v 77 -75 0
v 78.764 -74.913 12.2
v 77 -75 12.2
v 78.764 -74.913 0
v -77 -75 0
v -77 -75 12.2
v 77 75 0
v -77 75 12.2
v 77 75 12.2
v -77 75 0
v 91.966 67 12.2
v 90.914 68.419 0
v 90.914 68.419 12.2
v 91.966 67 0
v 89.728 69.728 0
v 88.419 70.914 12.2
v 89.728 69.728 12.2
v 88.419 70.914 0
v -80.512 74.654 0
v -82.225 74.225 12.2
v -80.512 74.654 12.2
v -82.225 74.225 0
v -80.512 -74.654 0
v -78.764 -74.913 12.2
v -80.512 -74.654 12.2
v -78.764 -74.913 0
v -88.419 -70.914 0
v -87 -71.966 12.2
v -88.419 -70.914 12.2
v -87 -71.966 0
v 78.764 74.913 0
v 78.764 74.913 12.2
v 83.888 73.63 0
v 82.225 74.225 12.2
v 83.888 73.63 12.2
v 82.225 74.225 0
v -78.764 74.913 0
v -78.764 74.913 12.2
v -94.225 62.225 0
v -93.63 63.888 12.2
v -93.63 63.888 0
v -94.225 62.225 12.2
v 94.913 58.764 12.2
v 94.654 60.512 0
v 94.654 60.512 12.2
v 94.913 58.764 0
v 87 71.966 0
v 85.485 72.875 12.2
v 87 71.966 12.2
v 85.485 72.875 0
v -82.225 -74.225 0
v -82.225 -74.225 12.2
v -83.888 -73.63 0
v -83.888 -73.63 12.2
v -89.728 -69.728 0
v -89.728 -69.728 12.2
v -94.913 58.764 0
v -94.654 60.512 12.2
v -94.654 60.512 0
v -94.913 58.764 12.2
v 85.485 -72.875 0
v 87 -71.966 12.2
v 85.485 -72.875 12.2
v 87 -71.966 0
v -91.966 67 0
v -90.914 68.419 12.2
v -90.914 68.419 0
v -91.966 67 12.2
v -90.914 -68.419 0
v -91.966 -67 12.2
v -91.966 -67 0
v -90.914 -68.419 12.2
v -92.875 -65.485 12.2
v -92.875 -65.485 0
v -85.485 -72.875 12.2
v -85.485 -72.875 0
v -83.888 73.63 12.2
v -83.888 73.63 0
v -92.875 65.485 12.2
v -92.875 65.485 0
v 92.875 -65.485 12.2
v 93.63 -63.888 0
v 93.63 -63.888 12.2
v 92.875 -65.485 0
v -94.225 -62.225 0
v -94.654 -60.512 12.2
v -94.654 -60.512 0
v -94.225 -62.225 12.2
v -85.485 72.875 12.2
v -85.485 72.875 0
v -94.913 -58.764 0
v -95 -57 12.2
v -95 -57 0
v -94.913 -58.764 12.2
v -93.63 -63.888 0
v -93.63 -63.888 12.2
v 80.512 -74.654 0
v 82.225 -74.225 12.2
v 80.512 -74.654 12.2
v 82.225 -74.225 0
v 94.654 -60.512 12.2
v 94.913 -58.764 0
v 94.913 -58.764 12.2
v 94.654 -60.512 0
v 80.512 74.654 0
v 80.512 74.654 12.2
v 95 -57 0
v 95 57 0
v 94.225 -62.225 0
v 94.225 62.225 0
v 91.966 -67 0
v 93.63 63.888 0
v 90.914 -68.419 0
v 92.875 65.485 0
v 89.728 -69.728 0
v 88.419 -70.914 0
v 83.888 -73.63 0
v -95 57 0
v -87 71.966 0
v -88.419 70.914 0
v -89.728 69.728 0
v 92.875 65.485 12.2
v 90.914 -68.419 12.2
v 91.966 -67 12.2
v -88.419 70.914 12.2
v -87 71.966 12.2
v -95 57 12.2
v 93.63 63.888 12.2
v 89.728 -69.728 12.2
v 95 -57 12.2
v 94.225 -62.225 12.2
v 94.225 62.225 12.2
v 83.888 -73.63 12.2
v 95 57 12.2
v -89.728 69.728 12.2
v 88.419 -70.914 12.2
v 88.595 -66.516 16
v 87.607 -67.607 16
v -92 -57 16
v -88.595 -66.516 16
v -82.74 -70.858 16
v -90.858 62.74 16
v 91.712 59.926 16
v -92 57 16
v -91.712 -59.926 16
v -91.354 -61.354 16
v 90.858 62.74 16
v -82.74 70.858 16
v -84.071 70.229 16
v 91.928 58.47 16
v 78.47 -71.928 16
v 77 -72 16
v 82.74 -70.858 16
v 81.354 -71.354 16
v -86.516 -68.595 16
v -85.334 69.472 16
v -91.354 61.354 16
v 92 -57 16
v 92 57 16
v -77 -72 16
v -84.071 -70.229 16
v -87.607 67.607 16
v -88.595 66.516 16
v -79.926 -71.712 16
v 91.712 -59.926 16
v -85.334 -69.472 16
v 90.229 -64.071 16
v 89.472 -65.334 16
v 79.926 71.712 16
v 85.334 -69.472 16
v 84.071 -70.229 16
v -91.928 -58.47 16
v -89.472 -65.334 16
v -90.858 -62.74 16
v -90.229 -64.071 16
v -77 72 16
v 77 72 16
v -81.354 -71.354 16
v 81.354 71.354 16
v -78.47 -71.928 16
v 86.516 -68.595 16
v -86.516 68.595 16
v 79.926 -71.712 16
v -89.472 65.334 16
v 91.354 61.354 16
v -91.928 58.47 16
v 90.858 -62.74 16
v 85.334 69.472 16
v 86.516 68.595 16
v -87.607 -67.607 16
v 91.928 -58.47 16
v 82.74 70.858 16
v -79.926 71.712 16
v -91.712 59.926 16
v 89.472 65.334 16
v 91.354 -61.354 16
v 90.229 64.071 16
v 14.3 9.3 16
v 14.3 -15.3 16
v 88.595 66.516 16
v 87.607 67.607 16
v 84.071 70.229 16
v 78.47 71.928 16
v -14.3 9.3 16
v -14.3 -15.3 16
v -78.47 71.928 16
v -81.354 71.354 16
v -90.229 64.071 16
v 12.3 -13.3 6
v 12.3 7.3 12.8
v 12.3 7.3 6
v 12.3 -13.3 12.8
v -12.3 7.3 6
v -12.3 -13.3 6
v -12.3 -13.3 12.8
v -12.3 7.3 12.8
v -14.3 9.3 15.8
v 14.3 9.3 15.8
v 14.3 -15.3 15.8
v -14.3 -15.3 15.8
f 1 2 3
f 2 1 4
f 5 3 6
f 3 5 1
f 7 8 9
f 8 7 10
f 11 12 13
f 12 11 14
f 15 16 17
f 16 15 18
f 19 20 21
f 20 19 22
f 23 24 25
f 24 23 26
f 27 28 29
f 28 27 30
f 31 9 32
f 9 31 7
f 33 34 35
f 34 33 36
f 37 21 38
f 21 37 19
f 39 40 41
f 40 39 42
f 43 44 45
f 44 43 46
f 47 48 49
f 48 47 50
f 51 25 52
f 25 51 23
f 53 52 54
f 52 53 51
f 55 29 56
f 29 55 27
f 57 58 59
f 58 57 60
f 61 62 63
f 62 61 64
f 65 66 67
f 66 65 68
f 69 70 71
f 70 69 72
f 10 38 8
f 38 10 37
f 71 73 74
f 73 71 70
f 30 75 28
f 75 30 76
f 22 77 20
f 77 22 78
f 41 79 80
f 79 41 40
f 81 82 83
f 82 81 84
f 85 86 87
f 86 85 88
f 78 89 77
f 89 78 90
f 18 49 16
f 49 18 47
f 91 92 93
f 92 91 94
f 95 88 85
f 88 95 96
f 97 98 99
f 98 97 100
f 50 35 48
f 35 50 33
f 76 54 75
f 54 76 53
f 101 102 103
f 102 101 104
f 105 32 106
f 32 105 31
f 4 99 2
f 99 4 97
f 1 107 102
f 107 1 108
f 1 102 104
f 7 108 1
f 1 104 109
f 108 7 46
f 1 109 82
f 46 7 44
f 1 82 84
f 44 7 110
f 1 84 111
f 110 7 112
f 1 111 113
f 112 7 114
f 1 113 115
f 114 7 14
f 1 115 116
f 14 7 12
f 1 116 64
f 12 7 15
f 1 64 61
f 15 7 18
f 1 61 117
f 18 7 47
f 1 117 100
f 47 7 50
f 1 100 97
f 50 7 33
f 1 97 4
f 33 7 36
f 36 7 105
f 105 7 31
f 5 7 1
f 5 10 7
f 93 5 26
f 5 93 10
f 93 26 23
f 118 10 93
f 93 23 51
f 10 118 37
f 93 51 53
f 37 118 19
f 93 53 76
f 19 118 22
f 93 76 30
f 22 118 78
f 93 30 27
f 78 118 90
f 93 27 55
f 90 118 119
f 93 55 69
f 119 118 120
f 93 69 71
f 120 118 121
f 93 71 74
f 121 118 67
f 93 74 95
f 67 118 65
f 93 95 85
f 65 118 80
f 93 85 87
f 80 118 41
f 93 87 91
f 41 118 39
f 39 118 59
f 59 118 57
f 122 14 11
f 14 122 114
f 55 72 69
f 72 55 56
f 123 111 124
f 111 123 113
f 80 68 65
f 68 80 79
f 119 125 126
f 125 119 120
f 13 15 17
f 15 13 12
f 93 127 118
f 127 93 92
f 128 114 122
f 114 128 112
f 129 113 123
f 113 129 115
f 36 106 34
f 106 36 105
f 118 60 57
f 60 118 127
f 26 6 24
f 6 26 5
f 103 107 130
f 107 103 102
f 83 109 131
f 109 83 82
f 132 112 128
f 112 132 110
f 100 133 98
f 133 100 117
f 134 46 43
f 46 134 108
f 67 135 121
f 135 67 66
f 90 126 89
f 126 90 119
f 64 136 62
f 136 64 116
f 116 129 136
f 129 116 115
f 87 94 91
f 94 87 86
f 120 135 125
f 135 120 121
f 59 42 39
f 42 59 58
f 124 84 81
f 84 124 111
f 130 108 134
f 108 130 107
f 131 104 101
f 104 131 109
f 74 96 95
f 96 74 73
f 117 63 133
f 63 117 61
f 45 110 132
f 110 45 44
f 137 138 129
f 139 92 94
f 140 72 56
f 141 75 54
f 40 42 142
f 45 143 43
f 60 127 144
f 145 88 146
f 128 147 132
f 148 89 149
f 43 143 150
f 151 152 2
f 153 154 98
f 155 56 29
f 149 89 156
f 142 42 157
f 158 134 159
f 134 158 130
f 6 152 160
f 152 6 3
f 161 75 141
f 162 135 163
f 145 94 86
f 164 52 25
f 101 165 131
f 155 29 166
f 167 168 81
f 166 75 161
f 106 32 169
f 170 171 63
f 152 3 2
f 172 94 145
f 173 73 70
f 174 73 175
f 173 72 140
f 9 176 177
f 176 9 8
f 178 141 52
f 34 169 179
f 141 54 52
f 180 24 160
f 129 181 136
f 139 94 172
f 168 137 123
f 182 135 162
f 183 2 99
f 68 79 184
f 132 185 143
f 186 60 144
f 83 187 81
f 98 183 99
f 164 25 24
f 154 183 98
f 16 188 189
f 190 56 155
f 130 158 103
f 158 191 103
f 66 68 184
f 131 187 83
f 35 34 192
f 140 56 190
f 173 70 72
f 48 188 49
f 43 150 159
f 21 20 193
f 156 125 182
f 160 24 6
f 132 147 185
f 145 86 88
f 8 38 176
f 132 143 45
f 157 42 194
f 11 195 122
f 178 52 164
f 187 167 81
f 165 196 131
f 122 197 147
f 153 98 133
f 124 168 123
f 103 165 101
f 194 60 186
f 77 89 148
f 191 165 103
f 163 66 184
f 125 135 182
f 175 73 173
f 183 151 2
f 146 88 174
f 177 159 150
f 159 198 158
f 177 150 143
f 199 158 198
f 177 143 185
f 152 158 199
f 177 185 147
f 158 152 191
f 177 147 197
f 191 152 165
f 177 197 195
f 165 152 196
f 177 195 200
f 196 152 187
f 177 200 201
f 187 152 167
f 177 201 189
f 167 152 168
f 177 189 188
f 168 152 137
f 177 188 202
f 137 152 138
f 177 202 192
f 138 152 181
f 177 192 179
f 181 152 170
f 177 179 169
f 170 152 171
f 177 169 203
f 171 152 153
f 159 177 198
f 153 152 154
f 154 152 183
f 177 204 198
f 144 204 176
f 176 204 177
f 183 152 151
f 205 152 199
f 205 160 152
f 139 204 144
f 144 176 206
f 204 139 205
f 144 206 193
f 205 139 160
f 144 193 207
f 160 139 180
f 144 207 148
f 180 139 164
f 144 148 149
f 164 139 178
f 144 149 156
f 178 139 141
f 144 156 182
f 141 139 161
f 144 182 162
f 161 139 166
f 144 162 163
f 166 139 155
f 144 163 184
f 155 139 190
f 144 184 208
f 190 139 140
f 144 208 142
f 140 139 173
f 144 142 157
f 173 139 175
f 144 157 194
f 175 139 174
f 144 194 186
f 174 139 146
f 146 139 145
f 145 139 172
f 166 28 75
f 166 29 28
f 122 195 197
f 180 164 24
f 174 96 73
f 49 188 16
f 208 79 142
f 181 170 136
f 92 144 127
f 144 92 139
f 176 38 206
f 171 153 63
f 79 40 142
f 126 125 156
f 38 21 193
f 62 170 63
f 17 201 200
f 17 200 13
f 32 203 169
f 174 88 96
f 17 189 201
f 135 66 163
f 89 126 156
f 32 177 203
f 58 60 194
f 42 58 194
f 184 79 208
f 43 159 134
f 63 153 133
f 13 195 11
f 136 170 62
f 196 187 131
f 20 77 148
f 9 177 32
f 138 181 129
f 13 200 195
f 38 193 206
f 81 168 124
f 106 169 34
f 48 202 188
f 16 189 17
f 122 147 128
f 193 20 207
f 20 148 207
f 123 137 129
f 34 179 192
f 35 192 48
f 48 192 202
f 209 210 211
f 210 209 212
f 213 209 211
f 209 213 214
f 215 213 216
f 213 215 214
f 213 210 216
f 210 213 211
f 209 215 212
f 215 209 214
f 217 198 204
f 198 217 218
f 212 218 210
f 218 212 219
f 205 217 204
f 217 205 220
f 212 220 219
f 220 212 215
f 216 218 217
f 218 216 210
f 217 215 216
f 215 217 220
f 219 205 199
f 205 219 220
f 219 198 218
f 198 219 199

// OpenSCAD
// Headphone stand in three parts: base, post, hanger.
// No glue, no screws. Rectangular tenon/socket press/clearance fits;
// rectangular sections stop the hanger spinning on the post.
// Print orientations:
//   base   - flat on the bed, socket up
//   post   - lying on its back face, long axis along X
//   hanger - lying on one side face, saddle profile in the X/Y plane
// Assembled top of hanger is 270 mm above the desk.

part = "base"; // [base, post, hanger, assembly]
cadverify_only = "";

$fn = 64;

/* Dimensions (mm) */
base_w = 190;
base_d = 150;
base_t = 16;
base_r = 18;

desk_to_hanger_top = 270;

post_len_print = 241;       // use z 7..248
hanger_len = 124;           // use/print x -62..62
hanger_width = 36;          // use y -18..18
hanger_h_print = 38;        // use z 232..270 at centre

/* Socket / tenon geometry (use coordinates, for reference)
   Post main section:  x -16..16, y -13..13
   Bottom tenon:       x -12..12, y -13..7,  z 7..16   (base socket z 6..16)
   Top tenon:          x -12..12, y -13..3,  z 232..248 (hanger socket from z 232)
   Sockets are tenon size + 0.3 mm clearance per side, with flared mouths.
*/

module instance(name, part_name, unit = 1) {
    echo(cadverify_instance = [name, part_name, unit]);
    if (cadverify_only == "" || cadverify_only == name) children();
}

module box3(x0, x1, y0, y1, z0, z1) {
    translate([x0, y0, z0]) cube([x1 - x0, y1 - y0, z1 - z0]);
}

module rounded_rect(w, d, r) {
    offset(r = r) square([w - 2 * r, d - 2 * r], center = true);
}

/* ---------------- BASE (print = use orientation) ---------------- */
module base_part() {
    difference() {
        union() {
            linear_extrude(12) rounded_rect(base_w, base_d, base_r);
            // 45-ish top edge taper: inset 3 mm over 4 mm height
            hull() {
                translate([0, 0, 12]) linear_extrude(0.2)
                    rounded_rect(base_w, base_d, base_r);
                translate([0, 0, base_t - 0.2]) linear_extrude(0.2)
                    rounded_rect(base_w - 6, base_d - 6, base_r - 3);
            }
        }
        // socket for post bottom tenon: 24.6 x 20.6, centre y=-3, floor z=6
        box3(-12.3, 12.3, -13.3, 7.3, 6, 17);
        // flared socket mouth (entry chamfer), 28.6 x 24.6 at the top face
        hull() {
            translate([0, -3, 15.9]) cube([28.6, 24.6, 0.2], center = true);
            translate([0, -3, 12.9]) cube([24.6, 20.6, 0.2], center = true);
        }
    }
}

/* ---------------- POST (print orientation) ----------------
   Print axes: X = use Z (length, 0 at bottom-tenon tip), Y = use X, Z = use Y + 13.
   Every section reaches Z=0 (the use back face), so it lies flat on the bed. */
module post_part() {
    union() {
        // bottom tenon, tapered lead-in in plan, 24 wide x 20 deep
        linear_extrude(20)
            polygon([[0, -9], [3, -12], [9, -12], [9, 12], [3, 12], [0, 9]]);
        // main shaft 32 x 26
        box3(9, 225, -16, 16, 0, 26);
        // bottom collar 52 wide, sits on the base top
        box3(9, 19, -26, 26, 0, 26);
        // top collar 48 wide, supports the hanger underside
        box3(217, 225, -24, 24, 0, 26);
        // top tenon, tapered lead-in in plan, 24 wide x 16 deep
        linear_extrude(16)
            polygon([[225, -12], [238, -12], [241, -9], [241, 9], [238, 12], [225, 12]]);
    }
}

/* ---------------- HANGER (print orientation) ----------------
   Print axes: X = use X, Y = use Z - 232, Z = use Y side face (0 on the bed).
   The saddle profile (parabolic top and bottom) is extruded across the width. */
module hanger_profile() {
    top = [for (i = [0 : 20]) let (x = -62 + 124 * i / 20)
        [x, hanger_h_print - 14 * pow(x / 62, 2)]];
    bot = [for (i = [20 : -1 : 0]) let (x = -62 + 124 * i / 20)
        [x, 12 * pow(x / 62, 2)]];
    polygon(concat(top, bot));
}

// Prismatic cutter in the Y/Z plane, extruded along X from -75 to 75.
// yz points are [y, z]; the region is the polygon given.
module cutter_yz(yz) {
    pts = [for (p = yz) [-p[1], p[0]]];   // local x = -z, local y = y
    translate([-75, 0, 0]) rotate([0, 90, 0]) linear_extrude(150) polygon(pts);
}

module hanger_part() {
    difference() {
        // saddle body: profile extruded 36 across
        linear_extrude(hanger_width) hanger_profile();
        // rounded (chamfered) longitudinal edges of the saddle top:
        // in print these cut the Y=profile-top / Z=0 and Z=36 corners.
        cutter_yz([[32, 36], [44, 30], [44, 52], [32, 52]]);   // Z=36 side
        cutter_yz([[32, -12], [44, -12], [44, 12], [32, 0]]);  // Z=0 side
        // socket for post top tenon: x -12.3..12.3, print z 14.7..31.3, depth to y=18
        box3(-12.3, 12.3, -2, 18, 14.7, 31.3);
        // flared socket mouth at the underside (print y = 0 face of the pocket)
        hull() {
            box3(-14.3, 14.3, -1.0, -0.8, 12.7, 33.3);
            box3(-12.3, 12.3, 5.0, 5.2, 14.7, 31.3);
        }
    }
}

/* ---------------- VERIFIABLE SPECS ---------------- */
if (part == "base") {
    echo(cadverify_spec = [
        ["bounds", [[-base_w/2, -base_d/2, 0], [base_w/2, base_d/2, base_t]]],
        ["bodies", 1],
        ["through_holes", 0],
        ["support_faces", [["bottom", "-z", 20000]]],
        ["overhangs_allowed", []],
        ["copies", 1],
        ["details", [
            ["base_plate", "material", [[-80, -60, 1], [80, 60, 5]], 0.95],
            ["socket", "void", [[-11, -12, 10], [11, 6, 16.5]], 0.95],
            ["socket_mouth_flare", "void", [[-13, -14, 15], [13, 8, 17]], 0.90],
            ["socket_floor", "thickness", [0, -3, 20], [0, 0, -1], 6],
            ["base_plate_thickness", "thickness", [60, 40, 20], [0, 0, -1], 16],
            ["top_edge_taper", "view", [[70, -20, 11], [96, 20, 17]]]
        ]]
    ]);
} else if (part == "post") {
    echo(cadverify_spec = [
        ["bounds", [[0, -26, 0], [post_len_print, 26, 26]]],
        ["bodies", 1],
        ["through_holes", 0],
        ["support_faces", [["back", "-z", 6000]]],
        ["overhangs_allowed", []],
        ["copies", 1],
        ["details", [
            ["main_shaft", "material", [[50, -14, 2], [100, 14, 24]], 0.95],
            ["bottom_collar", "material", [[10, -25, 2], [18, 25, 24]], 0.90],
            ["top_collar", "material", [[218, -23, 2], [224, 23, 24]], 0.90],
            ["beside_bottom_tenon", "void", [[1, 14, 2], [8, 20, 24]], 0.95],
            ["beside_top_tenon", "void", [[226, 14, 18], [240, 20, 24]], 0.95],
            ["shaft_depth", "thickness", [50, 0, -5], [0, 0, 1], 26],
            ["shaft_width", "thickness", [50, -30, 13], [0, 1, 0], 32],
            ["top_tenon", "view", [[215, -15, 0], [242, 15, 20]]]
        ]]
    ]);
} else if (part == "hanger") {
    echo(cadverify_spec = [
        ["bounds", [[-hanger_len/2, 0, 0], [hanger_len/2, hanger_h_print, hanger_width]]],
        ["bodies", 1],
        ["through_holes", 0],
        ["support_faces", [["side", "-z", 3000]]],
        ["overhangs_allowed", [
            ["internal socket ceiling: a 24.6 mm bridge across the socket, printed on its side; a short PLA bridge needs no support", [[-15, -1, 30], [15, 19, 35]]]
        ]],
        ["copies", 1],
        ["details", [
            ["saddle_centre", "material", [[-20, 28, 8], [20, 36, 28]], 0.90],
            ["socket", "void", [[-11, 2, 16], [11, 16, 30]], 0.95],
            ["material_above_socket", "thickness", [0, 45, 23], [0, -1, 0], 20],
            ["saddle_width", "thickness", [0, 20, -5], [0, 0, 1], 36],
            ["saddle_top_edge", "view", [[-25, 30, 28], [25, 39, 37]]]
        ]]
    ]);
} else if (part == "assembly") {
    echo(cadverify_spec = [
        ["bounds", [[-base_w/2, -base_d/2, 0], [base_w/2, base_d/2, desk_to_hanger_top]]],
        ["support_faces", [["desk", "-z", 20000]]],
        ["allowed_interferences", []],
        ["assembly_order", [
            [["base"], [0, 0, 0]],
            [["post"], [0, 0, -1]],
            [["hanger"], [0, 0, -1]]
        ]]
    ]);
}

/* ---------------- OUTPUT ---------------- */
if (part == "base") {
    base_part();
} else if (part == "post") {
    post_part();
} else if (part == "hanger") {
    hanger_part();
} else if (part == "assembly") {
    instance("base", "base") base_part();
    // print -> use: Xu=Yp, Yu=Zp-13, Zu=Xp+7
    instance("post", "post")
        multmatrix([[0, 1, 0, 0],
                    [0, 0, 1, -13],
                    [1, 0, 0, 7],
                    [0, 0, 0, 1]]) post_part();
    // print -> use: Xu=Xp, Yu=-Zp+18, Zu=Yp+232
    instance("hanger", "hanger")
        multmatrix([[1, 0, 0, 0],
                    [0, 0, -1, 18],
                    [0, 1, 0, 232],
                    [0, 0, 0, 1]]) hanger_part();
}
